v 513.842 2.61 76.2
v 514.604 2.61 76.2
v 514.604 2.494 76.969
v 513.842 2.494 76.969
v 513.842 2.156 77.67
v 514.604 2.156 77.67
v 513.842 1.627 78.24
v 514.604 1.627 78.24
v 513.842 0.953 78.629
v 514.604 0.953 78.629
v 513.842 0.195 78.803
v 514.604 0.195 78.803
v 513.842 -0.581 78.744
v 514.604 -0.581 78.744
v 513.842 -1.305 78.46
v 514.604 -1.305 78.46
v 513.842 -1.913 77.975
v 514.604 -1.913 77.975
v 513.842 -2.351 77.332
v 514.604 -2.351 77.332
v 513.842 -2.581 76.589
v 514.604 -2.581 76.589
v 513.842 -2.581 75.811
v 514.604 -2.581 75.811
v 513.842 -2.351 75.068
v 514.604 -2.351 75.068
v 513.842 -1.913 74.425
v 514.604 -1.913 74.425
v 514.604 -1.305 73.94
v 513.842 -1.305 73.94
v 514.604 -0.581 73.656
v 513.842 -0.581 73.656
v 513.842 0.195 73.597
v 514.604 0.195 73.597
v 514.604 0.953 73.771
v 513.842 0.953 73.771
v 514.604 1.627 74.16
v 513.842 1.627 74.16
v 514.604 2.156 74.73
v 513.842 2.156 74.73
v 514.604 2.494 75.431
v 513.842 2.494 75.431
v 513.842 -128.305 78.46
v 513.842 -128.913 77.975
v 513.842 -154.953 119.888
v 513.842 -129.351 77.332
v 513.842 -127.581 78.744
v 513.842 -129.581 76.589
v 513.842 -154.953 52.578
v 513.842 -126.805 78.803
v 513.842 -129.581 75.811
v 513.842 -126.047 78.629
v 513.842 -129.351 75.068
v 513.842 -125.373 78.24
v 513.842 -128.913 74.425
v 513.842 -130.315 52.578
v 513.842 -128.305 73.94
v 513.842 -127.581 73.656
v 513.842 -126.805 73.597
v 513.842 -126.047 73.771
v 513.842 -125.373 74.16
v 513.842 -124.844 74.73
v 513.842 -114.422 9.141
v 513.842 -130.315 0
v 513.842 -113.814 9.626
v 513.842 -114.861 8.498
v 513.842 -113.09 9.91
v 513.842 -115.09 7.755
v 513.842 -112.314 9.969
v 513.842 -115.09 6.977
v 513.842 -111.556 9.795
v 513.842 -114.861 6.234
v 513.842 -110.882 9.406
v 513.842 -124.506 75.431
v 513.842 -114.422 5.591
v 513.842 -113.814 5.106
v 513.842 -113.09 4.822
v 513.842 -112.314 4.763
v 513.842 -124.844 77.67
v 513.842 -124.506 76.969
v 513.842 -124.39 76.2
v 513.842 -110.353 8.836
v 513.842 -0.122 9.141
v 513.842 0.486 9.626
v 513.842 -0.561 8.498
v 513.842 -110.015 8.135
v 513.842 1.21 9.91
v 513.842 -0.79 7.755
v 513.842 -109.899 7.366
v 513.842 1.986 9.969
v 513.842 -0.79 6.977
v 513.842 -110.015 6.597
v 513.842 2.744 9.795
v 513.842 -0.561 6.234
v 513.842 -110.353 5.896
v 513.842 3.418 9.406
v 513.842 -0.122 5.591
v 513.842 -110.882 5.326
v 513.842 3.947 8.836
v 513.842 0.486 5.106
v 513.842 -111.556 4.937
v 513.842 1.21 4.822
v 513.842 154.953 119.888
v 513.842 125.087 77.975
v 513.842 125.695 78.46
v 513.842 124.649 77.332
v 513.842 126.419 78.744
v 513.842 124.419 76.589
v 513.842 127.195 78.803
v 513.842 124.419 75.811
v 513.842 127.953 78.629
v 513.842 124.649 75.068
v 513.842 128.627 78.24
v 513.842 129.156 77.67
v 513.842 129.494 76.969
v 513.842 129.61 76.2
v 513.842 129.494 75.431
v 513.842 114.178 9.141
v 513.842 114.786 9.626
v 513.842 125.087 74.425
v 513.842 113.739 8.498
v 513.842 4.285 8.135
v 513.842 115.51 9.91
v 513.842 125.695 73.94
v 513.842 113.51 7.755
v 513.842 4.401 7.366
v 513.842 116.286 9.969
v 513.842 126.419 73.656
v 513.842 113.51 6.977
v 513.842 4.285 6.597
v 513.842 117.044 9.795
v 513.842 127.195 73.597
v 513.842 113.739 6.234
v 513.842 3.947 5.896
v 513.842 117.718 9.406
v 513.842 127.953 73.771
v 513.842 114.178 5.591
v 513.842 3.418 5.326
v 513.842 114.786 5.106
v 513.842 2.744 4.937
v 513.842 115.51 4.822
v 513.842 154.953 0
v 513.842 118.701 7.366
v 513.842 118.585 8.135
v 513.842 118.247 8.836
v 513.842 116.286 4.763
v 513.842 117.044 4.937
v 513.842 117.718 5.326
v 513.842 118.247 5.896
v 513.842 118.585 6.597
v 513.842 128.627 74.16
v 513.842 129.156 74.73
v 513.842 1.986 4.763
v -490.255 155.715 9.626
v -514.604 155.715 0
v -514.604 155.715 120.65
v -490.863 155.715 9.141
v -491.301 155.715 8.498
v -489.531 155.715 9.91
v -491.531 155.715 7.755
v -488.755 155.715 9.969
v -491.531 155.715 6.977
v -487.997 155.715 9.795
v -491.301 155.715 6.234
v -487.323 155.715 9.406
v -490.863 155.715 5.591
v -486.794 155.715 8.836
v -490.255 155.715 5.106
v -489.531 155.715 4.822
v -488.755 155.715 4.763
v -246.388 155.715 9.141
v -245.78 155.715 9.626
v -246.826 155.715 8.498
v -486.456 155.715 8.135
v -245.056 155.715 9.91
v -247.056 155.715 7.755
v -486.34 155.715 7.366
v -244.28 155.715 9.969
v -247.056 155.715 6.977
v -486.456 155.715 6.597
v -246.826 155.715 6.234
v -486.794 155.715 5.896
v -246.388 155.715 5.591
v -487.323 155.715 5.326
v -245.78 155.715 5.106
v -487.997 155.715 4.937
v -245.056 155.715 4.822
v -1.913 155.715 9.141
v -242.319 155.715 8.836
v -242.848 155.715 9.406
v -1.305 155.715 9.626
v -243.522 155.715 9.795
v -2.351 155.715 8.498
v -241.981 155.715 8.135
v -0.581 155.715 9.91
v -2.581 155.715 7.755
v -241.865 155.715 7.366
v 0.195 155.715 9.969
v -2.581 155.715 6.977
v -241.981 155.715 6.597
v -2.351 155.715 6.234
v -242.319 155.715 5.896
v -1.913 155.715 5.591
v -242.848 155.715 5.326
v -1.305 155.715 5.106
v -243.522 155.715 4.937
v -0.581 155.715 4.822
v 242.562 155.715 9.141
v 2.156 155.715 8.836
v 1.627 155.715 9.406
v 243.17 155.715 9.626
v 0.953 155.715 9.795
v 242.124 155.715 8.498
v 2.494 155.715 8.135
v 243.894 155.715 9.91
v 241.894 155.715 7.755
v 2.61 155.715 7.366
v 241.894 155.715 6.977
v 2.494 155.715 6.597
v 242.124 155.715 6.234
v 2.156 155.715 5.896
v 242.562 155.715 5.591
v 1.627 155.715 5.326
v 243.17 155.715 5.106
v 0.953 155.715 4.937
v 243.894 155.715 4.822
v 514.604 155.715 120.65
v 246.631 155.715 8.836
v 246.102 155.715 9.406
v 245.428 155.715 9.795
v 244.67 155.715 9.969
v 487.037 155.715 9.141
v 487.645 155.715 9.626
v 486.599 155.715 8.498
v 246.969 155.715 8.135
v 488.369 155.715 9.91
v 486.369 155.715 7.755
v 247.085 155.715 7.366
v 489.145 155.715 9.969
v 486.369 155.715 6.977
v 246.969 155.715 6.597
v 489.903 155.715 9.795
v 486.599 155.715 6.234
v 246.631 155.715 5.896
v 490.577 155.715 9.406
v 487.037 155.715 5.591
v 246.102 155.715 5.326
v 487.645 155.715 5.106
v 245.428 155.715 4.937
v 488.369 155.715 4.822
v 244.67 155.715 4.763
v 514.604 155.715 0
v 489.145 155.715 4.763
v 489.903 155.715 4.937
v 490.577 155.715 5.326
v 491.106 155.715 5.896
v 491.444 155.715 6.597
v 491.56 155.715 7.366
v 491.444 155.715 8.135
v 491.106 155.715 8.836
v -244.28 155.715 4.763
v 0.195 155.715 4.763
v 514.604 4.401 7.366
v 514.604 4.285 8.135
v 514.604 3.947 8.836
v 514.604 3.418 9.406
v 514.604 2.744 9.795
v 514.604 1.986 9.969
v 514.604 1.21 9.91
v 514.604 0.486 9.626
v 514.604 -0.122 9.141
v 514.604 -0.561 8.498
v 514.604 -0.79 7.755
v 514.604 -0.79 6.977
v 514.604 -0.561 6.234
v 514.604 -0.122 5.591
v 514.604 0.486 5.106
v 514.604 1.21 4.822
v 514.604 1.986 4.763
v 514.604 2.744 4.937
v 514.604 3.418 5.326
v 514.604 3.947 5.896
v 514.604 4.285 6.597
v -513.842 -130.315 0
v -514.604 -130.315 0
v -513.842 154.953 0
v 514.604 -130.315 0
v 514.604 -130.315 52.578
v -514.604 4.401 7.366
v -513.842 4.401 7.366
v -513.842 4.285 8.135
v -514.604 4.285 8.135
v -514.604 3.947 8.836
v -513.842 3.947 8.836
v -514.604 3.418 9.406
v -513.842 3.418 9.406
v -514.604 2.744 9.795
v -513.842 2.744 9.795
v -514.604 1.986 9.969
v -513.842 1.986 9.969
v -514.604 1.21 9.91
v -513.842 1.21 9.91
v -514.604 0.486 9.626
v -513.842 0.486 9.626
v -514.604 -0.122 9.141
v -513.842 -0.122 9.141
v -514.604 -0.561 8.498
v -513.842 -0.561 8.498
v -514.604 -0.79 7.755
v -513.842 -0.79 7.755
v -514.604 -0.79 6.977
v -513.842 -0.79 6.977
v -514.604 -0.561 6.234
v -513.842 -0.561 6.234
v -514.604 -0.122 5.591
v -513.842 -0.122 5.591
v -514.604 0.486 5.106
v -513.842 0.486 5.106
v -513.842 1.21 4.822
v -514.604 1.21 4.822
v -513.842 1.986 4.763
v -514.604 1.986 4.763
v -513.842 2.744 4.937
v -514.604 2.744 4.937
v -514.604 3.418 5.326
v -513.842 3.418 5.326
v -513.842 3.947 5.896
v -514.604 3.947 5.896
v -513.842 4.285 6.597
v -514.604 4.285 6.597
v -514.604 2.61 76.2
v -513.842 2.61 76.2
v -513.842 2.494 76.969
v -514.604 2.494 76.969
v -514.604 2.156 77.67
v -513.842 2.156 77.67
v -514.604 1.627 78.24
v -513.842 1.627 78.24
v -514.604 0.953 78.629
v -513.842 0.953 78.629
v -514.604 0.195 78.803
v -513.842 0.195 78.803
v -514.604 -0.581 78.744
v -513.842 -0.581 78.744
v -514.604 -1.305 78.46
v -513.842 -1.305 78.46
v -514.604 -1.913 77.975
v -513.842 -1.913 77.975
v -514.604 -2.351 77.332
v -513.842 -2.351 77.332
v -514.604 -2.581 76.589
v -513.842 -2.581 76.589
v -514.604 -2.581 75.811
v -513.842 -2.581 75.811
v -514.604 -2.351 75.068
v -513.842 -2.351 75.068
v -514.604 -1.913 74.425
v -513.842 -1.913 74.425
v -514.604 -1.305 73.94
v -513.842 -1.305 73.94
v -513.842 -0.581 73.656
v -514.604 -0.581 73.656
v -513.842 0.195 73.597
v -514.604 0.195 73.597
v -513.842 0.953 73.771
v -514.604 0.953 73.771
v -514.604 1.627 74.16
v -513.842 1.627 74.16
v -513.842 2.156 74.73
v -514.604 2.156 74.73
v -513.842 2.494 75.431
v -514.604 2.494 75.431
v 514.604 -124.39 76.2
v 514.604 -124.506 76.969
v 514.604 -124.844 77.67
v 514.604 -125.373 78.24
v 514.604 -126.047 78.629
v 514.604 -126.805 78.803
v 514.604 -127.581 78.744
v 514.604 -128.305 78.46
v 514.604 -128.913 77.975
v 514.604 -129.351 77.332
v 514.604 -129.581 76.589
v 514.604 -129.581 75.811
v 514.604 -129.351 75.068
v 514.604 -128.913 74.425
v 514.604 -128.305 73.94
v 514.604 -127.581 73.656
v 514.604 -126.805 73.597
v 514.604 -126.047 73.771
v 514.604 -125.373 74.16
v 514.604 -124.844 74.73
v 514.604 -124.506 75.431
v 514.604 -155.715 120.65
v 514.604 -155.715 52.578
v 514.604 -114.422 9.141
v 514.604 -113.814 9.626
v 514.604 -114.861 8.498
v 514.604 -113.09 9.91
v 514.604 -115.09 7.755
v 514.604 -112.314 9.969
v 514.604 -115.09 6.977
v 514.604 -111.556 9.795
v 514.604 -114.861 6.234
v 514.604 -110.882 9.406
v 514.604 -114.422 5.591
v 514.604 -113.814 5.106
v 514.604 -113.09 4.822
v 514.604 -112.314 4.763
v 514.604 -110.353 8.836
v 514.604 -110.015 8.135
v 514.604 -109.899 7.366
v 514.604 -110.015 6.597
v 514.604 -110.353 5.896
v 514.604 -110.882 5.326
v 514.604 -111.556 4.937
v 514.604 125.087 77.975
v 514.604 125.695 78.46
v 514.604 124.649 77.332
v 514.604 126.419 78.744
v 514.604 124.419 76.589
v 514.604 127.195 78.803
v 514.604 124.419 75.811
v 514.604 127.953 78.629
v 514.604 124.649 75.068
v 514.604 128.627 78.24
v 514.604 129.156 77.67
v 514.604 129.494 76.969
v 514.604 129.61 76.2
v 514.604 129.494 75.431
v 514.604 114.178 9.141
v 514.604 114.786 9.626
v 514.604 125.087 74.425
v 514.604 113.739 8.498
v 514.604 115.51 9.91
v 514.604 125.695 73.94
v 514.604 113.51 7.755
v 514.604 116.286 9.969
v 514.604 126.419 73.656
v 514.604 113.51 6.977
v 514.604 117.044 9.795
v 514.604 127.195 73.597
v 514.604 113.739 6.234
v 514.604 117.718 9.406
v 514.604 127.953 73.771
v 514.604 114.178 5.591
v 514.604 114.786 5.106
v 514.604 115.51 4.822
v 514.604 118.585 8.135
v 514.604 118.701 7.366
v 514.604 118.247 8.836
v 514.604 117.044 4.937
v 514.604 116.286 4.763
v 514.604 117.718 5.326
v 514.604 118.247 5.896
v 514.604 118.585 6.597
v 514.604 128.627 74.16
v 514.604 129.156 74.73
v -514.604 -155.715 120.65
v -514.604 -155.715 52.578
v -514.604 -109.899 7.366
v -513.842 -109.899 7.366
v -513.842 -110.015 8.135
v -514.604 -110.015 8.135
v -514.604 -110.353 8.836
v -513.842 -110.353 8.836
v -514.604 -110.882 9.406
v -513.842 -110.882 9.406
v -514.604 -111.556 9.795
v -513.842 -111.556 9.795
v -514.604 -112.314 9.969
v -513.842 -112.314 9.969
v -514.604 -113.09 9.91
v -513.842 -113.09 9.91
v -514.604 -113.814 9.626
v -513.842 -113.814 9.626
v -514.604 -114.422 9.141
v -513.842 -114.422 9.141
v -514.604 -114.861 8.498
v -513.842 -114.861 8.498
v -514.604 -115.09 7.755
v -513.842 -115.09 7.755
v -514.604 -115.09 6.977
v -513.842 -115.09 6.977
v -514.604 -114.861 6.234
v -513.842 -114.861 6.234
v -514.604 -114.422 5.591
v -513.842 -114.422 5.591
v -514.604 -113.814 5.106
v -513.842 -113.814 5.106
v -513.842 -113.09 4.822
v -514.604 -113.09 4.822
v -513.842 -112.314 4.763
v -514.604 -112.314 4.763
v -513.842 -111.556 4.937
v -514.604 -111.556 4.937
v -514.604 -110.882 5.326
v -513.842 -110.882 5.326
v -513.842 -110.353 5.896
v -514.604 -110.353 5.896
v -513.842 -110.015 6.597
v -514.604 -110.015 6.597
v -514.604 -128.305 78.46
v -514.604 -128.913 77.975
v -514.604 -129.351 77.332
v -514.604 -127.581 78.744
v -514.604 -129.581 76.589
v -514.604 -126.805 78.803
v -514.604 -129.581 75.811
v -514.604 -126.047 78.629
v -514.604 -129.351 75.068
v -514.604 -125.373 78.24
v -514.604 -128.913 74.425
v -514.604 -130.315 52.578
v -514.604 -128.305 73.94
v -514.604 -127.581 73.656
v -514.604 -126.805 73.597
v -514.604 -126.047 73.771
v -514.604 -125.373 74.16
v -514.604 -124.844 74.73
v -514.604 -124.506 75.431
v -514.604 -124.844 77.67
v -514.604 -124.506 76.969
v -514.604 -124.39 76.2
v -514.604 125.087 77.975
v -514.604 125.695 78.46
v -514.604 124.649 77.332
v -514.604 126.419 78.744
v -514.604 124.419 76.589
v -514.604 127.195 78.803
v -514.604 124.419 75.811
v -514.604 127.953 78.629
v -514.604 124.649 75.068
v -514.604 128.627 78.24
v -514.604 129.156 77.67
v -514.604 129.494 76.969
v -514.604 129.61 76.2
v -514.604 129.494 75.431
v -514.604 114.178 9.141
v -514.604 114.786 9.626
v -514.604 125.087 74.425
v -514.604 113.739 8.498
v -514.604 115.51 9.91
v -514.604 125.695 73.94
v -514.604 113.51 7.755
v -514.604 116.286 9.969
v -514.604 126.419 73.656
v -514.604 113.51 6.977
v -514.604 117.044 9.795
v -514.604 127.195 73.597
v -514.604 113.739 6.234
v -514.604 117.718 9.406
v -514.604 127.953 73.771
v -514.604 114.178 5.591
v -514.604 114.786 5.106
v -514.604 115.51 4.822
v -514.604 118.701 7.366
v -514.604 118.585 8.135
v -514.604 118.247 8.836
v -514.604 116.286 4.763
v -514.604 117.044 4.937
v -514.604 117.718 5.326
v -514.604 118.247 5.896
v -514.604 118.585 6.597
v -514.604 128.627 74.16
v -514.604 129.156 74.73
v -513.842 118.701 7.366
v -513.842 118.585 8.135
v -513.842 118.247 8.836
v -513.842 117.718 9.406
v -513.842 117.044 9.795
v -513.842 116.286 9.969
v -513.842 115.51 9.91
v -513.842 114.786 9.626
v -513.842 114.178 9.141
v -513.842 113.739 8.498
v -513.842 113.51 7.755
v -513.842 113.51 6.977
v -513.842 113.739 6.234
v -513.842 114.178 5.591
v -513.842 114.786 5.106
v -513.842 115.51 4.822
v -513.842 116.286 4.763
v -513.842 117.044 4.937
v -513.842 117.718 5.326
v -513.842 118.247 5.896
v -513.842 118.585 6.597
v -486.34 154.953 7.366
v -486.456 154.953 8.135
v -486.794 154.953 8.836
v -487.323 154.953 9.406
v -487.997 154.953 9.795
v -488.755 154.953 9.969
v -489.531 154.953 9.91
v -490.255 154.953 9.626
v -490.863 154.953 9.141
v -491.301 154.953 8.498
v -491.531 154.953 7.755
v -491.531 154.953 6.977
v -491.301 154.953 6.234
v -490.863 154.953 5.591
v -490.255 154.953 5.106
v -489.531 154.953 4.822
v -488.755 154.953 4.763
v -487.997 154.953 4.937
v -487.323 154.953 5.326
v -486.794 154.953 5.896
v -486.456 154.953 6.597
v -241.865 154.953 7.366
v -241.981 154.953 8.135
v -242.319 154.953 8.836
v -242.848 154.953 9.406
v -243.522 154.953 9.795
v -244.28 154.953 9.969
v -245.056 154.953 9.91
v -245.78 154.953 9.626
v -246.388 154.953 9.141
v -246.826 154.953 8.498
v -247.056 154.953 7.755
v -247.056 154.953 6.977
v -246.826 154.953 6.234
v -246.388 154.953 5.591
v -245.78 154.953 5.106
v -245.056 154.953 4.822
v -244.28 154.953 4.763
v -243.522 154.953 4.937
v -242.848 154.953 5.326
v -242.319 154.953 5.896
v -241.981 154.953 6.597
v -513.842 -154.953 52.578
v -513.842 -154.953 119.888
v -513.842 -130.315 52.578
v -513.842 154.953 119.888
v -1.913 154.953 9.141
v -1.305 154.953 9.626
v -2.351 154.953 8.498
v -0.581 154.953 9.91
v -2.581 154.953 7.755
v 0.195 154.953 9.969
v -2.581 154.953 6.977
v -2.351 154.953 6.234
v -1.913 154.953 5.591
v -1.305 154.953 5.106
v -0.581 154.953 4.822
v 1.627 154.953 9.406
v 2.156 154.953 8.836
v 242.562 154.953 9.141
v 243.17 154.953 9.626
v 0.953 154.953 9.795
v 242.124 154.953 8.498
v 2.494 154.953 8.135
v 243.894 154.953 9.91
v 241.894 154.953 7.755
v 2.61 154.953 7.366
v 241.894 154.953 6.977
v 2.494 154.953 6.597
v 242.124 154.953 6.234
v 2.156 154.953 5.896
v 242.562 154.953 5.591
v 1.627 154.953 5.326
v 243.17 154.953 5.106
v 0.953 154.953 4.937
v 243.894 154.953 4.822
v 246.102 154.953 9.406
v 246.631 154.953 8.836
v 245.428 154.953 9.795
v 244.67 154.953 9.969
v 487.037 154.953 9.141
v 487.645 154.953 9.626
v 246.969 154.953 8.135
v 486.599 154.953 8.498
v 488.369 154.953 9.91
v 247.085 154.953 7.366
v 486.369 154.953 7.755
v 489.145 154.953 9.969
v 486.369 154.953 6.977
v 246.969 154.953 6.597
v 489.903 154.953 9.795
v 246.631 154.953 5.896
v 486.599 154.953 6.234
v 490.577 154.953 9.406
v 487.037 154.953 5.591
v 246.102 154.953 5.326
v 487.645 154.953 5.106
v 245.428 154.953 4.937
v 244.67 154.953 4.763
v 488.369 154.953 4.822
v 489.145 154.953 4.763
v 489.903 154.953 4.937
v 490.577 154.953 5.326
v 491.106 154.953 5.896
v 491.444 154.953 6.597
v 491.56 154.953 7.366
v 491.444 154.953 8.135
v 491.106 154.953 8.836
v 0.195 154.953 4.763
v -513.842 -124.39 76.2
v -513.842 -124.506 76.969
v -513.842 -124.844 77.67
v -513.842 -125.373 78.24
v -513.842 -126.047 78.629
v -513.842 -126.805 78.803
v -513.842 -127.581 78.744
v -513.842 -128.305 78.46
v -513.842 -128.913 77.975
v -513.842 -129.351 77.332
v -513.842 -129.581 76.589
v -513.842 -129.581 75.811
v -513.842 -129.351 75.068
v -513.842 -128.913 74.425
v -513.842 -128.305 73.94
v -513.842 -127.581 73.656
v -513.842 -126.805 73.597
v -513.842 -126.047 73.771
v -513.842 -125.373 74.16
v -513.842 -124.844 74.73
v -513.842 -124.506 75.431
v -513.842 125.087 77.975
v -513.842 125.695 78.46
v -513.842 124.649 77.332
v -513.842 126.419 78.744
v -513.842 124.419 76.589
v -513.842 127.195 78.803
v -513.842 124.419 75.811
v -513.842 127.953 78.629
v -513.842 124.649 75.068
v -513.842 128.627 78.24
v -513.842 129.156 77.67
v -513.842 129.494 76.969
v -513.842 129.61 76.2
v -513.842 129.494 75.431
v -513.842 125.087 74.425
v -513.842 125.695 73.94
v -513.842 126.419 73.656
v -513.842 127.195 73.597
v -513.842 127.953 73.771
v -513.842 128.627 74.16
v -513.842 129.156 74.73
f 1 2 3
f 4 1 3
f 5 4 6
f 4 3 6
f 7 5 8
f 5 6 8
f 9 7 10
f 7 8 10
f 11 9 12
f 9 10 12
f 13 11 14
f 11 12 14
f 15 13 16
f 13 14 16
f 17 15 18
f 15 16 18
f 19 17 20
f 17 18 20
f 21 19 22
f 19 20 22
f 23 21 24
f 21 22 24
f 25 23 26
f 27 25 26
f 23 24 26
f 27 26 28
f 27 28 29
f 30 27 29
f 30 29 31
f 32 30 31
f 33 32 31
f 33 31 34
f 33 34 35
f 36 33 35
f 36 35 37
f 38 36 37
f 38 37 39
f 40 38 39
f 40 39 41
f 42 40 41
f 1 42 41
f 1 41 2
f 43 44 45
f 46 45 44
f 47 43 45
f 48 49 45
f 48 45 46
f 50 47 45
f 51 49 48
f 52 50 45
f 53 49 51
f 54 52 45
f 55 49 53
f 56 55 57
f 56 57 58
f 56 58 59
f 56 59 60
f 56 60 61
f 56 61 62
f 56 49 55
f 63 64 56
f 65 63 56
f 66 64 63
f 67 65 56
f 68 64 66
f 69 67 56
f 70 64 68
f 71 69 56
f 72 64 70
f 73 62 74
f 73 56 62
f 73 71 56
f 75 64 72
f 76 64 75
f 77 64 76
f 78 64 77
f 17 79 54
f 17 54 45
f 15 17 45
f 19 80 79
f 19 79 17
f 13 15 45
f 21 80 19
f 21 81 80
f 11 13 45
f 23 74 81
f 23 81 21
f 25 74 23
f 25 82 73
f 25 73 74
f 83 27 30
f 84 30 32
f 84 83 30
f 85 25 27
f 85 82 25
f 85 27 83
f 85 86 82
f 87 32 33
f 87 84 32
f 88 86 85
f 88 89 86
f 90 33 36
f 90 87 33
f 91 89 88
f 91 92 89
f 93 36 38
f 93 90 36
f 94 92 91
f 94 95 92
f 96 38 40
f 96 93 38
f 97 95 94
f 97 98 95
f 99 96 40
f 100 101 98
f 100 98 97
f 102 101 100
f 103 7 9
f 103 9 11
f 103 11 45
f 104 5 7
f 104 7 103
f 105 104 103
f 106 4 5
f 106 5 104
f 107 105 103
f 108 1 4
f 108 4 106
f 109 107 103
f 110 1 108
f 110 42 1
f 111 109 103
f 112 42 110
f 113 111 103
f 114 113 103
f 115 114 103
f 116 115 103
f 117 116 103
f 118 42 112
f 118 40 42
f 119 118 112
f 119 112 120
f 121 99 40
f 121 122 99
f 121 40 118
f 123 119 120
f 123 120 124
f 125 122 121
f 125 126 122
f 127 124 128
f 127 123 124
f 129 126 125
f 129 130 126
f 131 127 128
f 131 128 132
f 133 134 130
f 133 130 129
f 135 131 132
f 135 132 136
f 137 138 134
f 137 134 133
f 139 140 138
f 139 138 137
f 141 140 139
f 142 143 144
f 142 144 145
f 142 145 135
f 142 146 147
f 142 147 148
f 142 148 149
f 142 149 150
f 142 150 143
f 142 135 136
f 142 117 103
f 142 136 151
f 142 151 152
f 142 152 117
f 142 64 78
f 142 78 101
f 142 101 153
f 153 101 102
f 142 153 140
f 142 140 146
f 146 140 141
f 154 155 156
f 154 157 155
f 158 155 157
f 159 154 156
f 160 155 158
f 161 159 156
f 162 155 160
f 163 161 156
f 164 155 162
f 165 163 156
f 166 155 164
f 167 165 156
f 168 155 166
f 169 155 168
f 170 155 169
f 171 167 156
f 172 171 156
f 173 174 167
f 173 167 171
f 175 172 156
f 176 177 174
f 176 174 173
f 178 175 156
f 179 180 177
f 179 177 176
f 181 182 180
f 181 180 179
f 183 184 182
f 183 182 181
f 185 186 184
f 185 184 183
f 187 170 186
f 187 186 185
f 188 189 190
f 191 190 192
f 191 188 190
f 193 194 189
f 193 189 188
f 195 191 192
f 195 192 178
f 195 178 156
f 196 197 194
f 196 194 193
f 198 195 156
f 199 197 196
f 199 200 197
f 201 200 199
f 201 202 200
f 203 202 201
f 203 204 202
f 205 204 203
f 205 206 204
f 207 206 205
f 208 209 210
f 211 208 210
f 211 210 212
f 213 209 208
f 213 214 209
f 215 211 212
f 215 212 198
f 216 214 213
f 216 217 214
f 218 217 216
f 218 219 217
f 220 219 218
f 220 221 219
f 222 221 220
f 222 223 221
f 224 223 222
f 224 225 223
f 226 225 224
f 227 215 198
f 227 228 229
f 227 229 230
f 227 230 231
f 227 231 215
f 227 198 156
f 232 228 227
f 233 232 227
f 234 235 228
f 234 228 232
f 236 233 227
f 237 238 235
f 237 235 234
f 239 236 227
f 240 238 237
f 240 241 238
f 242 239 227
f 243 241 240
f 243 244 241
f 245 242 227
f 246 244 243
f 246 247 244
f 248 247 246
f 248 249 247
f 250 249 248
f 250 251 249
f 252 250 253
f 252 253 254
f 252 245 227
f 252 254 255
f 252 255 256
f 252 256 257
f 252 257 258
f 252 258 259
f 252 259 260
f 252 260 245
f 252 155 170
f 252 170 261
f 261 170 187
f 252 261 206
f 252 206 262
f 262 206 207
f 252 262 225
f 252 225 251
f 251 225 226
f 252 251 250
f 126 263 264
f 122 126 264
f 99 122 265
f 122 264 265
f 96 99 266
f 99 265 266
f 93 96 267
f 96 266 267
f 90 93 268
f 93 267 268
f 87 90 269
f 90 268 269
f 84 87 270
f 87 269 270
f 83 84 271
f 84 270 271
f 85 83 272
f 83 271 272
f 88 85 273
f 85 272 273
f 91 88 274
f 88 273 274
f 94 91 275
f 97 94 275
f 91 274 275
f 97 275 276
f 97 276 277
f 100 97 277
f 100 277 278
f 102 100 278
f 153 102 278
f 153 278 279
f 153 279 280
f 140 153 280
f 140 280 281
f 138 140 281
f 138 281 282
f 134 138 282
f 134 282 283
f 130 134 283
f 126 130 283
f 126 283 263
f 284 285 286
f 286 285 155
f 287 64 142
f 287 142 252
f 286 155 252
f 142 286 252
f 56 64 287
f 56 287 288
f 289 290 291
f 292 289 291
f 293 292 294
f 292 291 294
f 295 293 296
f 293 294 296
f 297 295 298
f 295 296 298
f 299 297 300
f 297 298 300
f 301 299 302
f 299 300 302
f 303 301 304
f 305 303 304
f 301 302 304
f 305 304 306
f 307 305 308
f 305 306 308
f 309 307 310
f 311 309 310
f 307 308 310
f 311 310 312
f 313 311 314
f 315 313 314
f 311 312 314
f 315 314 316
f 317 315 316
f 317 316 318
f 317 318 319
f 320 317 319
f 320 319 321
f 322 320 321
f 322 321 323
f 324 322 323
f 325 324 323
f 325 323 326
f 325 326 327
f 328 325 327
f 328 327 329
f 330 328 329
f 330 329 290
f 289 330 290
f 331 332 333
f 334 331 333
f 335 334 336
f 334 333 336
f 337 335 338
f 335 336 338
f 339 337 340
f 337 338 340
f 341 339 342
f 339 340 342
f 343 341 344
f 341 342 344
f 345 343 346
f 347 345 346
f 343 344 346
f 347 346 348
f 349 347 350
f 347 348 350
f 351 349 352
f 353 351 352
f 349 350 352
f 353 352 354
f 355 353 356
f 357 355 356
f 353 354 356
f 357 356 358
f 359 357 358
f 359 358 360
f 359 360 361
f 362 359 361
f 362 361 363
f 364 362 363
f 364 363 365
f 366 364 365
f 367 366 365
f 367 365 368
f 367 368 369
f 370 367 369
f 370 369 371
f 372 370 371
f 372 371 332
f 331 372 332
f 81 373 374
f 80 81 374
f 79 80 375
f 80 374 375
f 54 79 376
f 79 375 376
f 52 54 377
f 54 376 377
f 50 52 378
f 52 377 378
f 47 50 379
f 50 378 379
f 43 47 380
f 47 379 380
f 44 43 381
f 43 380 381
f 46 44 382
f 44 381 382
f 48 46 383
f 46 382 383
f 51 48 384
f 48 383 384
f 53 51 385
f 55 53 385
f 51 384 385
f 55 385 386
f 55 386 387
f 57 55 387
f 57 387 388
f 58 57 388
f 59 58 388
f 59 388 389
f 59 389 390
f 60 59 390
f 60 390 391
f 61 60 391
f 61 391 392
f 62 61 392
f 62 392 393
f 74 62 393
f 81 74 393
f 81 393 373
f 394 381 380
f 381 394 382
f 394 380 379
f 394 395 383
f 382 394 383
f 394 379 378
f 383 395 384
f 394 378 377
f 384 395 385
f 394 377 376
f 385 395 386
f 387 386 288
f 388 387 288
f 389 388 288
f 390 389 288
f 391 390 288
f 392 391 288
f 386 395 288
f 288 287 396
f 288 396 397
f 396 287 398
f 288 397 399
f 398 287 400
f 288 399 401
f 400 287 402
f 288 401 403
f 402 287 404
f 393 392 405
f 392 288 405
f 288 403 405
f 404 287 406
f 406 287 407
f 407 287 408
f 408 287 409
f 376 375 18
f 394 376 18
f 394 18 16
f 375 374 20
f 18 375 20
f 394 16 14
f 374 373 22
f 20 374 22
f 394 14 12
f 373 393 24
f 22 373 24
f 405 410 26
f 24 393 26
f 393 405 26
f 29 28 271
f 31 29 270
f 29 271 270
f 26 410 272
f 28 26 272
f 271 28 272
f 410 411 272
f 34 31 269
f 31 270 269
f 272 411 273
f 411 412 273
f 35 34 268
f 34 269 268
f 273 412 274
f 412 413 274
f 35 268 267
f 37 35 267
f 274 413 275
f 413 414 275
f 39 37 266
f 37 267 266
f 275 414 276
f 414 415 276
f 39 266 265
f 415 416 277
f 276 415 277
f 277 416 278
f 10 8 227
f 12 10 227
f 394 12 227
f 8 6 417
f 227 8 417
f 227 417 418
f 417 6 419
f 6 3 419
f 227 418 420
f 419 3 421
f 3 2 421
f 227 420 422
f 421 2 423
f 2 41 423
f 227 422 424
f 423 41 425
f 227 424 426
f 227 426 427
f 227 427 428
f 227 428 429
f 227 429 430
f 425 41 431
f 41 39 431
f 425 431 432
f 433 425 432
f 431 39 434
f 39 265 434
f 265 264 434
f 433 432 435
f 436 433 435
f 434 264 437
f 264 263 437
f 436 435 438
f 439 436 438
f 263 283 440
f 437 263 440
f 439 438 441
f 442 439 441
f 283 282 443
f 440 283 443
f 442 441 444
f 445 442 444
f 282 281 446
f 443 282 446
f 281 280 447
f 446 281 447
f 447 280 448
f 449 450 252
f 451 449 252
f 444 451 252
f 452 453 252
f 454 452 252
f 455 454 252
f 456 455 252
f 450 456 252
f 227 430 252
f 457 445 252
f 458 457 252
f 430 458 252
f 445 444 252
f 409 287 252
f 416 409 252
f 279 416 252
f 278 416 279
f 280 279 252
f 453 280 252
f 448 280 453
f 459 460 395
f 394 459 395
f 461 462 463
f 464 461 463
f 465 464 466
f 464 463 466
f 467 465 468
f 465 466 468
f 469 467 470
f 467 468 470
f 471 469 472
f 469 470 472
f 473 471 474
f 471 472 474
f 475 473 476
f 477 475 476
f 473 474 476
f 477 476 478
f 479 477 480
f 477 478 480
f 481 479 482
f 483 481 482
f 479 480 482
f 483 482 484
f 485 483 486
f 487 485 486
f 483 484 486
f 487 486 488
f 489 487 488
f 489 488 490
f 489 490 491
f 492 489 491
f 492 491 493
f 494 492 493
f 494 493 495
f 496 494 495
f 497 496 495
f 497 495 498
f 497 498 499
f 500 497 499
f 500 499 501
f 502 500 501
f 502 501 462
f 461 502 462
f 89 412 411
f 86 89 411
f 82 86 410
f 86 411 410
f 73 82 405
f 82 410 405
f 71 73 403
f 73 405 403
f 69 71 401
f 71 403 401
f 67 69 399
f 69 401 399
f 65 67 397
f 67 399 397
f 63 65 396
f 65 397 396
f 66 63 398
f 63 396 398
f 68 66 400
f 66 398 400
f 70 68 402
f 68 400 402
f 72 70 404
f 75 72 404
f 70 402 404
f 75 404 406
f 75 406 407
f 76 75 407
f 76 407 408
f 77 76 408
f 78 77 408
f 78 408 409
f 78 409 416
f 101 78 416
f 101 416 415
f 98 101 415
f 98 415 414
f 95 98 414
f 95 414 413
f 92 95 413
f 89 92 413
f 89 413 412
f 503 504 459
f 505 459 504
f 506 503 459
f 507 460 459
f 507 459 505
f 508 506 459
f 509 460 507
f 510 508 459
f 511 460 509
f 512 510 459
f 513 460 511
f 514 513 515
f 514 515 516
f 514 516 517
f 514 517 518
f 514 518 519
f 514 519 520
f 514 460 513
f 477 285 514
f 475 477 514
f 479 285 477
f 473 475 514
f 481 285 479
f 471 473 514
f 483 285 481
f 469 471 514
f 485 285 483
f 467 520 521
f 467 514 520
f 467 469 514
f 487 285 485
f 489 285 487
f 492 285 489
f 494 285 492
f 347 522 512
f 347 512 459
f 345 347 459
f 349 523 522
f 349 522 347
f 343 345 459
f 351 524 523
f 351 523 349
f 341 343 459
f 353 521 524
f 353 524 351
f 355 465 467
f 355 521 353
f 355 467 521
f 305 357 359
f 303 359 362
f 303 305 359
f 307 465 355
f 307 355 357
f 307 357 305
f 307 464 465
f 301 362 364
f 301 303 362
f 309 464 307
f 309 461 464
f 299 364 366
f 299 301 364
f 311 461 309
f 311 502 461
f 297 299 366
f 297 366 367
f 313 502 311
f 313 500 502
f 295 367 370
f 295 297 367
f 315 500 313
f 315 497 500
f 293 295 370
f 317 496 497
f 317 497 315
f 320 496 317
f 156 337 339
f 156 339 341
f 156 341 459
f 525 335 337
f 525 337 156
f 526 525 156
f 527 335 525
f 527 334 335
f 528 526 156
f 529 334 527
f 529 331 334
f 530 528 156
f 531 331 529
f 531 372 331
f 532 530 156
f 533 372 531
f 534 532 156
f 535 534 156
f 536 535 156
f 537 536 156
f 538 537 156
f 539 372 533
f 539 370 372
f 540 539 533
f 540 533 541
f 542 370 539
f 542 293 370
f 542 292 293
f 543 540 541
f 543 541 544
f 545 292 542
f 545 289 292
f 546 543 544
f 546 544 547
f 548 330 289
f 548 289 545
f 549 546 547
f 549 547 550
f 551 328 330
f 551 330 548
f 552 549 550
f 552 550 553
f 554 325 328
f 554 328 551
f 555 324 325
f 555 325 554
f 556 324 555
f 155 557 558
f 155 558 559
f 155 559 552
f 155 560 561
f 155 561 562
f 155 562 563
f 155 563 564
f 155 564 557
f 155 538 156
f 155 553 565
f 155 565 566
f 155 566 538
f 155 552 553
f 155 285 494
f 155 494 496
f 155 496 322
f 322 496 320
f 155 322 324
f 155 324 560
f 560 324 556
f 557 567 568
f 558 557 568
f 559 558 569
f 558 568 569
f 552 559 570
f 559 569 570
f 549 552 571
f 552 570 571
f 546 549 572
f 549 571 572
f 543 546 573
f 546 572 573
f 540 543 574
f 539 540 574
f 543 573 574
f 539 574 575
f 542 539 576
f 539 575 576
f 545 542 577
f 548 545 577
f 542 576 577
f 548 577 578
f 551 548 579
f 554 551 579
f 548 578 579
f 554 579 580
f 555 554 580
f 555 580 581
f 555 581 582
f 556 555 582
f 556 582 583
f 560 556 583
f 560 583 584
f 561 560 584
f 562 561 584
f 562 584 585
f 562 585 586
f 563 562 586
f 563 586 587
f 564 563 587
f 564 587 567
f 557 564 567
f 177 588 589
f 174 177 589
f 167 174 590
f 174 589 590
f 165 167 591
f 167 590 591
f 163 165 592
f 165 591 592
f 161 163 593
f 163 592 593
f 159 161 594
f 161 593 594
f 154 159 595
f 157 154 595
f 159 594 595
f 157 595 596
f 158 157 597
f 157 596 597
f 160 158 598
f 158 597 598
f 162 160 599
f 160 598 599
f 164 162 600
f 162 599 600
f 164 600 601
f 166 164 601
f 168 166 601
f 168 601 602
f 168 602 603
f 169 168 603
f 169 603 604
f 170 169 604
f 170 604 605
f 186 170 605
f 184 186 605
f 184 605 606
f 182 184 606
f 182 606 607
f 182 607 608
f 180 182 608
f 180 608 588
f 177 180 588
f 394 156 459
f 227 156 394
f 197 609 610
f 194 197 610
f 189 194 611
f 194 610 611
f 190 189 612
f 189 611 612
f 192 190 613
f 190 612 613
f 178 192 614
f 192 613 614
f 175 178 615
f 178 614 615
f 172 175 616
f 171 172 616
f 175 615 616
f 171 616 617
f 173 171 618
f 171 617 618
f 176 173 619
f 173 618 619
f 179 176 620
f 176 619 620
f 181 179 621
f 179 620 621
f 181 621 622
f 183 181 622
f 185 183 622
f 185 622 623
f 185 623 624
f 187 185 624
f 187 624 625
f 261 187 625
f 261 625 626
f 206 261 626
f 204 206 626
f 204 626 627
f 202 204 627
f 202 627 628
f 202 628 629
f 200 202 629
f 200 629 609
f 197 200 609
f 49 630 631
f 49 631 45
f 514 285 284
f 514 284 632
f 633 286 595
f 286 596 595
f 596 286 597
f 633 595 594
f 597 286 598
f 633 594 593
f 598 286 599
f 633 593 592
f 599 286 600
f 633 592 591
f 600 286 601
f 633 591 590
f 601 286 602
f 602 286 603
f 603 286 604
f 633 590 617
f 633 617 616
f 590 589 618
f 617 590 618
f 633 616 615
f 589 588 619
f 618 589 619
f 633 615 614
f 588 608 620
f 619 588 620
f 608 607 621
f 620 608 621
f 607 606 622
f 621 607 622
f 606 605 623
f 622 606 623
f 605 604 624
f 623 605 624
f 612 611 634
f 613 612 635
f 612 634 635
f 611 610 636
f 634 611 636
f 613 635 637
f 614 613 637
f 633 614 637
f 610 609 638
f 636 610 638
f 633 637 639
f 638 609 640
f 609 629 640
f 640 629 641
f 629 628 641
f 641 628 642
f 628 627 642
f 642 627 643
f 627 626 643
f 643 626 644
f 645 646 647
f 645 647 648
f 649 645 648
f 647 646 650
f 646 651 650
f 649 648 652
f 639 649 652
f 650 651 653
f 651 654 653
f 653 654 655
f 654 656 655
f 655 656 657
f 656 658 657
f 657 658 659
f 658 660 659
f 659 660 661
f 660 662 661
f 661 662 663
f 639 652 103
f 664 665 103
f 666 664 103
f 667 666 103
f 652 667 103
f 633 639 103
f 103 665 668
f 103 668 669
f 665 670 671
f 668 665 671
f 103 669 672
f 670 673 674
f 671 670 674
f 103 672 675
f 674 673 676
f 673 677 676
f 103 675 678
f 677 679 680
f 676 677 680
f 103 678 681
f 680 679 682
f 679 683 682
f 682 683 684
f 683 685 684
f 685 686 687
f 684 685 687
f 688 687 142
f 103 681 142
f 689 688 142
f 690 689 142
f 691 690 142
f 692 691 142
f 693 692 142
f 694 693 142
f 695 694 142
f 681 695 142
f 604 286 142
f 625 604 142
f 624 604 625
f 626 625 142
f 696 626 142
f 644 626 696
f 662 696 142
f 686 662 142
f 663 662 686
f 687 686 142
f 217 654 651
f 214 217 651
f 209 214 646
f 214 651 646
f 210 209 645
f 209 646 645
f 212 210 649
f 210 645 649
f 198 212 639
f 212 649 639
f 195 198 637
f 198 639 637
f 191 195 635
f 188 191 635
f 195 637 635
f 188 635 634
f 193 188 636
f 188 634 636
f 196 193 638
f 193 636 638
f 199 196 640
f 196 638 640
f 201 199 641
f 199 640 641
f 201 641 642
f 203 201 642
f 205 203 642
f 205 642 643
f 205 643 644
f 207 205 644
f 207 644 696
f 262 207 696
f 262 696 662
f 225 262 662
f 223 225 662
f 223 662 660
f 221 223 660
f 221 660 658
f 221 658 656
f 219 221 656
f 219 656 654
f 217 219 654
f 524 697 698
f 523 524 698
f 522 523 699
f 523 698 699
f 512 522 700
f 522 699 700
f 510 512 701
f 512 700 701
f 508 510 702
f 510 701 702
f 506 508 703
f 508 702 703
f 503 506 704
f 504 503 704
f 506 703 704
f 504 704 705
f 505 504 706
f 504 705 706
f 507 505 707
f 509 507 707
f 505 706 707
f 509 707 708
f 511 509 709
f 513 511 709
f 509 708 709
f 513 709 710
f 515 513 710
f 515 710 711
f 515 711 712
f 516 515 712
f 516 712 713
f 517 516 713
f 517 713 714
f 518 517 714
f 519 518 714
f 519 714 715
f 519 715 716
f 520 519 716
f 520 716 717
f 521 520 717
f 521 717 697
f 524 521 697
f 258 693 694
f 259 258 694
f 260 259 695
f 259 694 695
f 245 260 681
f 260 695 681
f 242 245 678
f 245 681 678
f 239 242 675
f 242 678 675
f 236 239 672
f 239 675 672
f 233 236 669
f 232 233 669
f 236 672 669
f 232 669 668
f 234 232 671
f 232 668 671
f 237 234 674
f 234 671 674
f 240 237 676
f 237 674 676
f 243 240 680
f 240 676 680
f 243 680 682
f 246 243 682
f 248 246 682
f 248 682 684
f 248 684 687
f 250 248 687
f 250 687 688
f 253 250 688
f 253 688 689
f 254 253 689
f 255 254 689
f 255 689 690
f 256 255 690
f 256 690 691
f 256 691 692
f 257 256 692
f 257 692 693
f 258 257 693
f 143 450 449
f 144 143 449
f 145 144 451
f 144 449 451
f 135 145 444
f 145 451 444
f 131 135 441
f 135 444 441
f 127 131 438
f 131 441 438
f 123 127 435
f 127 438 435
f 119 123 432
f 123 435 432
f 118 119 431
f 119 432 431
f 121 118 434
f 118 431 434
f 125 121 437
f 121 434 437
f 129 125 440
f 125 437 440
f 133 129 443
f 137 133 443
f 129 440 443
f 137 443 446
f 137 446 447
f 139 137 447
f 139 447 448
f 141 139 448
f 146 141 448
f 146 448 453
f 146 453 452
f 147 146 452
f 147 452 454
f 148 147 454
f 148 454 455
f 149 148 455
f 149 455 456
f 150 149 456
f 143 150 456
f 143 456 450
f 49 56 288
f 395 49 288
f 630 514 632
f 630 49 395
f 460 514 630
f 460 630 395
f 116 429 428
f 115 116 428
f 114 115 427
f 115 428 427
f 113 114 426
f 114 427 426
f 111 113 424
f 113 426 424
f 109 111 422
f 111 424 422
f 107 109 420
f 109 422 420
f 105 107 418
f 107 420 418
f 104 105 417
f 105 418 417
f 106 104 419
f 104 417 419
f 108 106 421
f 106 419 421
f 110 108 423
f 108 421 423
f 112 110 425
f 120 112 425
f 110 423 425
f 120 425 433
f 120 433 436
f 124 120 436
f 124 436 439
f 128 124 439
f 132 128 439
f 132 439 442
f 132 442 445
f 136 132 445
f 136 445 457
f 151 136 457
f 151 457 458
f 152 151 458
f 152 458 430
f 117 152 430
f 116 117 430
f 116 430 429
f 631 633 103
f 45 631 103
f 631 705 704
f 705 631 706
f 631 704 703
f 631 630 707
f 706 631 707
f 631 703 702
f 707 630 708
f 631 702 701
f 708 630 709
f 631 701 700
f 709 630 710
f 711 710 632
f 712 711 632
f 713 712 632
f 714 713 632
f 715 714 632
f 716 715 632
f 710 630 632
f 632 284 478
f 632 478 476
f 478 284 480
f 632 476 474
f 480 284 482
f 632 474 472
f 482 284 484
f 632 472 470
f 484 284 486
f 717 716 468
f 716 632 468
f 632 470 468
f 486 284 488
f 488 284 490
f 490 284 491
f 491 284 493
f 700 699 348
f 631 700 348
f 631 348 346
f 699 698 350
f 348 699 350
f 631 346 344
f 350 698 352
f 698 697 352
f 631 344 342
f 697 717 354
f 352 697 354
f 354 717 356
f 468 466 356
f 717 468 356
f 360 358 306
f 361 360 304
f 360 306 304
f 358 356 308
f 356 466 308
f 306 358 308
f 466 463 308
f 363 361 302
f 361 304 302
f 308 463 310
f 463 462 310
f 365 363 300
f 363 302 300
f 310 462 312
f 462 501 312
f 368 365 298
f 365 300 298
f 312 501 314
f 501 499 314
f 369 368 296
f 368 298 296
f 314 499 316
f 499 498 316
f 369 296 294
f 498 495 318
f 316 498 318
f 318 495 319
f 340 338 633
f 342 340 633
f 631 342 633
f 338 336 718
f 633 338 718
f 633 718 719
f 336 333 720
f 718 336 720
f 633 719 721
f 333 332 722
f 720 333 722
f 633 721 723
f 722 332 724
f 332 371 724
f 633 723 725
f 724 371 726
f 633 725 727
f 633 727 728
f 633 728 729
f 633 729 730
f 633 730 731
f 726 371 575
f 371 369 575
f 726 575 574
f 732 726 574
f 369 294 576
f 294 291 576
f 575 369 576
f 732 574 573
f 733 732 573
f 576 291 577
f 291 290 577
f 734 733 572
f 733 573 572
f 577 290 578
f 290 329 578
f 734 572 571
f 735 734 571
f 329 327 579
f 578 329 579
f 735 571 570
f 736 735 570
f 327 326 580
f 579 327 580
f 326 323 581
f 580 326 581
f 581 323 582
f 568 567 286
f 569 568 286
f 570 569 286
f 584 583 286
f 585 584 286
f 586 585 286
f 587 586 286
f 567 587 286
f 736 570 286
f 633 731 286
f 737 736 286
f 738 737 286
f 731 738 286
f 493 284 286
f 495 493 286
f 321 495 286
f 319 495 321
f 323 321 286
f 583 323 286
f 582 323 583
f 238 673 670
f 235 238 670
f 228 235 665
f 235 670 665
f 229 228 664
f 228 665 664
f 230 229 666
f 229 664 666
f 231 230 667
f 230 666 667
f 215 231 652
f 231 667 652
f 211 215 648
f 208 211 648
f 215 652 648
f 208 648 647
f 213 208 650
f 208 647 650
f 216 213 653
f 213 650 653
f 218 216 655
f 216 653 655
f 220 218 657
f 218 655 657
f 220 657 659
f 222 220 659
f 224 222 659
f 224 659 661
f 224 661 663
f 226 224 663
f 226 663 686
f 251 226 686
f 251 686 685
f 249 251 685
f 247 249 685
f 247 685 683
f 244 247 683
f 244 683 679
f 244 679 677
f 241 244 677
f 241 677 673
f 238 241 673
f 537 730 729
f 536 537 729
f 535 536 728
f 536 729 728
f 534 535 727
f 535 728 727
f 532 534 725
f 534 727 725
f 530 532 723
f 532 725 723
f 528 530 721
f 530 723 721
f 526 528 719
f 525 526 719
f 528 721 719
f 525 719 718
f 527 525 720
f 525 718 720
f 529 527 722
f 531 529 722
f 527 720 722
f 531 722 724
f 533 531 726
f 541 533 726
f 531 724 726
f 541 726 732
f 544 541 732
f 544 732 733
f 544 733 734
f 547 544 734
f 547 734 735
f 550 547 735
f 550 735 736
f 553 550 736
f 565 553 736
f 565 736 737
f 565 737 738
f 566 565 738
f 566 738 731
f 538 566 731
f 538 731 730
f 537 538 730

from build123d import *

# Parameters (mm, degrees)
F0_W     = 1029.208
F0_H     = 311.4294
F1_DEPTH = 120.65
F2_T     = -0.762
F3_W     = 25.4
F3_H     = 52.578
F4_DEPTH = 1029.209
F6_D     = 5.2197
F6_DEPTH = 1.016
F6_TIP   = 1.5681560866
F8_D     = 5.2197
F10_D    = 5.2197


# Not quite as in the source:
# - a feature names something its author has since deleted; it is built from what else it names


with BuildPart() as f1:
    # F0 (on Top) → F1 (new body)
    with BuildSketch(Plane.XY):
        Rectangle(F0_W, F0_H)
    extrude(amount=F1_DEPTH)

    # F2
    f2_openings = [f1.faces().sort_by_distance(p)[0] for p in [
        (0, 0, 0),
    ]]
    offset(amount=F2_T, openings=f2_openings)

    # F3 (on face) → F4 (cut, through all)
    with BuildSketch(Plane(origin=(-514.604, 0, 0), x_dir=(0, -1, 0), z_dir=(-1, 0, 0))):
        with Locations((143.0147, 26.289)):
            Rectangle(F3_W, F3_H)
    extrude(amount=-F4_DEPTH, mode=Mode.SUBTRACT)

    # F6
    with Locations(Plane(origin=(0, 155.7147, 0), x_dir=(-1, 0, 0), z_dir=(0, 1, 0))):
        with Locations((-488.95, 7.366), (488.95, 7.366), (0, 7.366), (-244.475, 7.366), (244.475, 7.366)):
            Hole(F6_D / 2, depth=F6_DEPTH)
            with Locations((0, 0, -(F6_DEPTH + F6_TIP / 2))):  # 118° drill point
                Cone(0, F6_D / 2, F6_TIP, mode=Mode.SUBTRACT)

    # F8 (through all)
    with Locations(Plane(origin=(-514.604, 0, 0), x_dir=(0, -1, 0), z_dir=(-1, 0, 0))):
        with Locations((-116.0907, 7.366), (-1.7907, 7.366), (112.5093, 7.366)):
            Hole(F8_D / 2)

    # F10 (through all)
    with Locations(Plane(origin=(-514.604, 0, 0), x_dir=(0, -1, 0), z_dir=(-1, 0, 0))):
        with Locations((-127, 76.2), (0, 76.2), (127, 76.2)):
            Hole(F10_D / 2)


solid = f1.part
